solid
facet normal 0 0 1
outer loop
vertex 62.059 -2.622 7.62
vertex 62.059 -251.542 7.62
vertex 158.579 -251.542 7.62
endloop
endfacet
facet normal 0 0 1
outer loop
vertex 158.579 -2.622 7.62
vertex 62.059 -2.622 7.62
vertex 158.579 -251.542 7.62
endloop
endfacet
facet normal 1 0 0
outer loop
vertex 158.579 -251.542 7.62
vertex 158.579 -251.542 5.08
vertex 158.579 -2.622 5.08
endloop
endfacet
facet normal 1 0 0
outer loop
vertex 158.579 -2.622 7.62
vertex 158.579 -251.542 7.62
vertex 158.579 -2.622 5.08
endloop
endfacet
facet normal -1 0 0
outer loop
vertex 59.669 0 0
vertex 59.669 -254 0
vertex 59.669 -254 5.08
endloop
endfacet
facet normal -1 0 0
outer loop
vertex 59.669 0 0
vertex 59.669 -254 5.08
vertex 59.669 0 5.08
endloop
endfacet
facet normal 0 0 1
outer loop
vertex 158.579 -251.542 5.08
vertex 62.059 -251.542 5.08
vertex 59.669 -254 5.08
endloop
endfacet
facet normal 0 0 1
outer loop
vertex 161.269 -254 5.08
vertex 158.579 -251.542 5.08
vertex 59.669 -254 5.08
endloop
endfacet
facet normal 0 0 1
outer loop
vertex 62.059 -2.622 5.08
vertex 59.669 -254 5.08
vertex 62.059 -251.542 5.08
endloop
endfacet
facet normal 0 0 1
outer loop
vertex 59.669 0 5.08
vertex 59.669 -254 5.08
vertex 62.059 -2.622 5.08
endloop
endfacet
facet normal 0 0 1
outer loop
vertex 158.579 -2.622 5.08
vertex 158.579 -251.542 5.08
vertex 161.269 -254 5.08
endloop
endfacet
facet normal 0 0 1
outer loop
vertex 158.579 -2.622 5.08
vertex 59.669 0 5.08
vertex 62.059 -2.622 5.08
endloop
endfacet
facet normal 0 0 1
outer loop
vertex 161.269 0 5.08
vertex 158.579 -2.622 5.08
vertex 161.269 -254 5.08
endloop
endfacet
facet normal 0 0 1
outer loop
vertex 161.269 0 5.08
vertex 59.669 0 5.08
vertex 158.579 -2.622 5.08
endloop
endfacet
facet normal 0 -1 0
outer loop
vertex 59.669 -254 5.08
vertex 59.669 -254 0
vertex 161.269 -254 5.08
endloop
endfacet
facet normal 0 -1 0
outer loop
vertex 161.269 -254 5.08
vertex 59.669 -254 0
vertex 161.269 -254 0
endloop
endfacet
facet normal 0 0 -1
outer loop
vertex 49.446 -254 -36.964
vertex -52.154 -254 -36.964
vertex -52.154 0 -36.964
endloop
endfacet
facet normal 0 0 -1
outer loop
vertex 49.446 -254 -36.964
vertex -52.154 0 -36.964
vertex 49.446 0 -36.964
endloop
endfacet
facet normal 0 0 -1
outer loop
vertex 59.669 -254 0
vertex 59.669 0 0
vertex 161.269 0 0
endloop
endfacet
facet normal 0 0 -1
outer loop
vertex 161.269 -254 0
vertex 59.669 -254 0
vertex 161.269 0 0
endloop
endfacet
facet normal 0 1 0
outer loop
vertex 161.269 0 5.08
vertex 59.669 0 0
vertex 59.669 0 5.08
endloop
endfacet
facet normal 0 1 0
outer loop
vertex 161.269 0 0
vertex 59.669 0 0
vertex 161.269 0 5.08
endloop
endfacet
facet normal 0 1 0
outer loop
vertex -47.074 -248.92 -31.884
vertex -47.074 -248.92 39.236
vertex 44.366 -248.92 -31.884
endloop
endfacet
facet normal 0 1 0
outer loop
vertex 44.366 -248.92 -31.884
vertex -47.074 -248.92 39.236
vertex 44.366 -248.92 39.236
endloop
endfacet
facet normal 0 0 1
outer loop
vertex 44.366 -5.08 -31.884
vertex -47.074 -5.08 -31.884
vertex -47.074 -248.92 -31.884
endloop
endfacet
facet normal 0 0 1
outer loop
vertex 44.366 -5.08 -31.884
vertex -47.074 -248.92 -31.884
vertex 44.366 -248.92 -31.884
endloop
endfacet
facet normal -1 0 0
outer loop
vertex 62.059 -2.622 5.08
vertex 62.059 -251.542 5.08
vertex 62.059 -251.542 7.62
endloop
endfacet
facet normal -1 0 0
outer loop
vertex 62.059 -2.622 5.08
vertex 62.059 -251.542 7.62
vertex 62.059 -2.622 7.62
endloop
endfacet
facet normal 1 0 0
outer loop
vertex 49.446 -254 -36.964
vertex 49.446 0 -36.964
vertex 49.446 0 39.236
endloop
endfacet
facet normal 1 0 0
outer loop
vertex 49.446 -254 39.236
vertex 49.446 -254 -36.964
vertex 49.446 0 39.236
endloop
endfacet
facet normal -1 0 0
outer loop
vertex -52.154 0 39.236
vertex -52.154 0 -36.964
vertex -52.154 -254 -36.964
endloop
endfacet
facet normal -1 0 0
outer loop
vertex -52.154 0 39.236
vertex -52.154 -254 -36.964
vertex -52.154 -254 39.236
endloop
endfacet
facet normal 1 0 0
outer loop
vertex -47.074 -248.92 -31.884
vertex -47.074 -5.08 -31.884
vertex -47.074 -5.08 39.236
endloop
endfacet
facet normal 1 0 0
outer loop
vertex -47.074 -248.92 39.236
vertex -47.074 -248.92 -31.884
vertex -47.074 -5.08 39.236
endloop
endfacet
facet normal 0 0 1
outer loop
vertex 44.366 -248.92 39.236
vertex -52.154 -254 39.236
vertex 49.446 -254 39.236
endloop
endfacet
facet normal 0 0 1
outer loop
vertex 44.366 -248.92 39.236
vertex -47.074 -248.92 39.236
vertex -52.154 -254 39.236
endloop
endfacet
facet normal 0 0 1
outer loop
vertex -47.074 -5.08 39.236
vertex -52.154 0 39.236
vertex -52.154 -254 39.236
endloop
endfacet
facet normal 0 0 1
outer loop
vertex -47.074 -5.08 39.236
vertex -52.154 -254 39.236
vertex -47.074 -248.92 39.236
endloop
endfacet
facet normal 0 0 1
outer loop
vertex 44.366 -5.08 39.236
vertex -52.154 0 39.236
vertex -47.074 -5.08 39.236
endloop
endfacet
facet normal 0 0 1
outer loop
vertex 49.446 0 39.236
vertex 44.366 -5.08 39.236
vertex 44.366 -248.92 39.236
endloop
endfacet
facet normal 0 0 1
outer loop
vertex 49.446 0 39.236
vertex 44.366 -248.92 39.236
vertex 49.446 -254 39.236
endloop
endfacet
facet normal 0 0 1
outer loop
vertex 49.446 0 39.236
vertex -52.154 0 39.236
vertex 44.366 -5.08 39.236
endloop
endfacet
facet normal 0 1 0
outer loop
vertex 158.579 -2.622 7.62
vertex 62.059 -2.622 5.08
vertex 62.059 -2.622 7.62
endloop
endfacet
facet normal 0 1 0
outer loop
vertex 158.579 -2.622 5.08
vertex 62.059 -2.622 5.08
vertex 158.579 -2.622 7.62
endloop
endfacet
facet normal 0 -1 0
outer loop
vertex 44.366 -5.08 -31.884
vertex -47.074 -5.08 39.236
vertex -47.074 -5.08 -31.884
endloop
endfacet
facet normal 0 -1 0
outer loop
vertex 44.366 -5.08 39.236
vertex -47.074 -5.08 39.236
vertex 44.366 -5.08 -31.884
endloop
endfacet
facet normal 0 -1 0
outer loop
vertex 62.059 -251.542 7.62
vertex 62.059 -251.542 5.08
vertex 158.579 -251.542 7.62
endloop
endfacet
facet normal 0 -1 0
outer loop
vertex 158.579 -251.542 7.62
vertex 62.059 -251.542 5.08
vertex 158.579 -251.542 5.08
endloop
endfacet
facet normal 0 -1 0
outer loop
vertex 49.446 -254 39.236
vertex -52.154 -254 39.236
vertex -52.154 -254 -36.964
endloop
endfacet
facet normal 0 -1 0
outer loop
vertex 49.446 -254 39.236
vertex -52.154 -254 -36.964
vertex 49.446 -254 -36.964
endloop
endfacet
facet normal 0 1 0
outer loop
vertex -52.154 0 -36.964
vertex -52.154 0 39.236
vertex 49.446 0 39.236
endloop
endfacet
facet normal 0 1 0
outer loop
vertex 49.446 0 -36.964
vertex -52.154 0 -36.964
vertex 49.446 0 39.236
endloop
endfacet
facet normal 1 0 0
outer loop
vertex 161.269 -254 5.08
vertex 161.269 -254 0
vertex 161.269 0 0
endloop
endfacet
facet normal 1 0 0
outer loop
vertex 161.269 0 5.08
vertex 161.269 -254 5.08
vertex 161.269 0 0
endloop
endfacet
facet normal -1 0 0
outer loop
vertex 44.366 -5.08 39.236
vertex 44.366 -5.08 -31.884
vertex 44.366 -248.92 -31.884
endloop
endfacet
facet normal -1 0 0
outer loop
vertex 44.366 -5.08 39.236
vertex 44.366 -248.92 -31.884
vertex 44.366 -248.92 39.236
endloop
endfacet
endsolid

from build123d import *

# Parameters (mm, degrees)
F0_W     = 101.6
F0_H     = 76.2
F1_DEPTH = 254
F2_T     = -5.08
F3_W     = 101.6
F3_H     = 254
F4_DEPTH = 5.08
F5_W     = 96.52
F5_H     = 248.92
F6_DEPTH = 2.54


with BuildPart() as f1:
    # F0 (on Front) → F1 (new body)
    with BuildSketch(Plane.XZ):
        with Locations((-1.353553, 1.136445)):
            Rectangle(F0_W, F0_H)
    extrude(amount=F1_DEPTH)

    # F2
    f2_openings = [f1.faces().sort_by_distance(p)[0] for p in [
        (-1.353553, -127, 39.236445),
    ]]
    offset(amount=F2_T, openings=f2_openings)


with BuildPart() as f4:
    # F3 (on Top) → F4 (new body)
    with BuildSketch(Plane.XY):
        with Locations((110.469144, -127)):
            Rectangle(F3_W, F3_H)
    extrude(amount=F4_DEPTH)

    # F5 (on face) → F6 (join)
    with BuildSketch(Plane.XY.offset(5.08)):
        with Locations((110.319471, -127.081529)):
            Rectangle(F5_W, F5_H)
    extrude(amount=F6_DEPTH)


solid = Compound([f1.part, f4.part])
